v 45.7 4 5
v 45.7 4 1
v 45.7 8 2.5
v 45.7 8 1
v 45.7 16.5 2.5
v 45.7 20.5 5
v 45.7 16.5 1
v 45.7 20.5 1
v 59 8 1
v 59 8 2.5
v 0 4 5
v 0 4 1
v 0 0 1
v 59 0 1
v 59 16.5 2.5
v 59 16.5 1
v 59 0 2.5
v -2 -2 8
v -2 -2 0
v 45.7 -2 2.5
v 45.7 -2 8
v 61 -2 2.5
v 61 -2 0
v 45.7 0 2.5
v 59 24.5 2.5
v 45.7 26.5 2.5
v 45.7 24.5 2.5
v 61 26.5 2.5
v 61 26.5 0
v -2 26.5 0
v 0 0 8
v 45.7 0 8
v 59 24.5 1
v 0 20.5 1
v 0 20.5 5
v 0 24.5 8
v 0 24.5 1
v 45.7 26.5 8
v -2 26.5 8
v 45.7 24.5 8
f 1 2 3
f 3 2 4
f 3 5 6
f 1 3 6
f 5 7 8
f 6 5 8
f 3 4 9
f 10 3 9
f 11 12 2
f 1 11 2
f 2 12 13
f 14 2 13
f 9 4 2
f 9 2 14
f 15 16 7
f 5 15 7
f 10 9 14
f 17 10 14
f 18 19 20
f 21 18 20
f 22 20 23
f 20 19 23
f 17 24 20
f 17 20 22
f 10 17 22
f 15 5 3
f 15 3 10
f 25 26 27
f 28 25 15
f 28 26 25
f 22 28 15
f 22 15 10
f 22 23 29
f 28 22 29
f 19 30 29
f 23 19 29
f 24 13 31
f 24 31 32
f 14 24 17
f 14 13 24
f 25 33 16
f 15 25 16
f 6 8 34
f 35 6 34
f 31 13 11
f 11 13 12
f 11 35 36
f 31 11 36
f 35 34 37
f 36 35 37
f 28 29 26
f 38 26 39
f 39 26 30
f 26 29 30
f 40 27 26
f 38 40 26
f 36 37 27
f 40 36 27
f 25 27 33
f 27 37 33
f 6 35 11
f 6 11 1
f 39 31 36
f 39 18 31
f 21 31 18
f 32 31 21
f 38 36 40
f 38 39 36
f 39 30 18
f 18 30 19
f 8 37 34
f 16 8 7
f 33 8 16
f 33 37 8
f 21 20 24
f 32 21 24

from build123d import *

# Parameters (mm, degrees)
F0_W     = 45.7
F0_H     = 4
F1_DEPTH = 1
F0_W_2   = 13.3
F0_H_2   = 2
F0_H_3   = 8.5
F0_W_3   = 2
F2_DEPTH = 2.5
F3_DEPTH = 5
F4_DEPTH = 8


with BuildPart() as f1:
    # F0 (on Top) → F1 (new body)
    with BuildSketch(Plane.XY):
        Polygon((59, 16.5), (59, 24.5), (45.7, 24.5), (45.7, 20.5), (45.7, 16.5), align=None)
        with Locations((22.85, 22.5)):
            Rectangle(F0_W, F0_H)
    extrude(amount=F1_DEPTH)



with BuildPart() as f1b:
    # F0 (on Top) → F1, piece 2 (new body)
    with BuildSketch(Plane.XY):
        Polygon((59, 0), (59, 8), (45.7, 8), (45.7, 4), (45.7, 0), align=None)
        with Locations((22.85, 2)):
            Rectangle(F0_W, F0_H)
    extrude(amount=F1_DEPTH)


with BuildPart() as f1_1:
    add(f1.part)

    add(f1b.part)  # F2 merges F1b
    # F0 (on Top) → F2 (join)
    with BuildSketch(Plane.XY):
        with Locations((52.35, 25.5)):
            Rectangle(F0_W_2, F0_H_2)
        with Locations((52.35, 12.25)):
            Rectangle(F0_W_2, F0_H_3)
        with Locations((52.35, -1)):
            Rectangle(F0_W_2, F0_H_2)
        with Locations((60, 12.25)):
            Rectangle(F0_W_3, F0_H_3)
        Polygon((61, -2), (61, 8), (59, 8), (59, 0), (59, -2), align=None)
        Polygon((61, 26.5), (59, 26.5), (59, 24.5), (59, 16.5), (61, 16.5), align=None)
    extrude(amount=F2_DEPTH)

    # F0 (on Top) → F3 (join)
    with BuildSketch(Plane.XY):
        Polygon((45.7, 8), (45.7, 16.5), (45.7, 20.5), (0, 20.5), (0, 4), (45.7, 4), align=None)
    extrude(amount=F3_DEPTH)

    # F0 (on Top) → F4 (join)
    with BuildSketch(Plane.XY):
        Polygon((45.7, 24.5), (45.7, 26.5), (-2, 26.5), (-2, -2), (45.7, -2), (45.7, 0), (0, 0), (0, 4), (0, 20.5), (0, 24.5), align=None)
    extrude(amount=F4_DEPTH)


solid = f1_1.part
